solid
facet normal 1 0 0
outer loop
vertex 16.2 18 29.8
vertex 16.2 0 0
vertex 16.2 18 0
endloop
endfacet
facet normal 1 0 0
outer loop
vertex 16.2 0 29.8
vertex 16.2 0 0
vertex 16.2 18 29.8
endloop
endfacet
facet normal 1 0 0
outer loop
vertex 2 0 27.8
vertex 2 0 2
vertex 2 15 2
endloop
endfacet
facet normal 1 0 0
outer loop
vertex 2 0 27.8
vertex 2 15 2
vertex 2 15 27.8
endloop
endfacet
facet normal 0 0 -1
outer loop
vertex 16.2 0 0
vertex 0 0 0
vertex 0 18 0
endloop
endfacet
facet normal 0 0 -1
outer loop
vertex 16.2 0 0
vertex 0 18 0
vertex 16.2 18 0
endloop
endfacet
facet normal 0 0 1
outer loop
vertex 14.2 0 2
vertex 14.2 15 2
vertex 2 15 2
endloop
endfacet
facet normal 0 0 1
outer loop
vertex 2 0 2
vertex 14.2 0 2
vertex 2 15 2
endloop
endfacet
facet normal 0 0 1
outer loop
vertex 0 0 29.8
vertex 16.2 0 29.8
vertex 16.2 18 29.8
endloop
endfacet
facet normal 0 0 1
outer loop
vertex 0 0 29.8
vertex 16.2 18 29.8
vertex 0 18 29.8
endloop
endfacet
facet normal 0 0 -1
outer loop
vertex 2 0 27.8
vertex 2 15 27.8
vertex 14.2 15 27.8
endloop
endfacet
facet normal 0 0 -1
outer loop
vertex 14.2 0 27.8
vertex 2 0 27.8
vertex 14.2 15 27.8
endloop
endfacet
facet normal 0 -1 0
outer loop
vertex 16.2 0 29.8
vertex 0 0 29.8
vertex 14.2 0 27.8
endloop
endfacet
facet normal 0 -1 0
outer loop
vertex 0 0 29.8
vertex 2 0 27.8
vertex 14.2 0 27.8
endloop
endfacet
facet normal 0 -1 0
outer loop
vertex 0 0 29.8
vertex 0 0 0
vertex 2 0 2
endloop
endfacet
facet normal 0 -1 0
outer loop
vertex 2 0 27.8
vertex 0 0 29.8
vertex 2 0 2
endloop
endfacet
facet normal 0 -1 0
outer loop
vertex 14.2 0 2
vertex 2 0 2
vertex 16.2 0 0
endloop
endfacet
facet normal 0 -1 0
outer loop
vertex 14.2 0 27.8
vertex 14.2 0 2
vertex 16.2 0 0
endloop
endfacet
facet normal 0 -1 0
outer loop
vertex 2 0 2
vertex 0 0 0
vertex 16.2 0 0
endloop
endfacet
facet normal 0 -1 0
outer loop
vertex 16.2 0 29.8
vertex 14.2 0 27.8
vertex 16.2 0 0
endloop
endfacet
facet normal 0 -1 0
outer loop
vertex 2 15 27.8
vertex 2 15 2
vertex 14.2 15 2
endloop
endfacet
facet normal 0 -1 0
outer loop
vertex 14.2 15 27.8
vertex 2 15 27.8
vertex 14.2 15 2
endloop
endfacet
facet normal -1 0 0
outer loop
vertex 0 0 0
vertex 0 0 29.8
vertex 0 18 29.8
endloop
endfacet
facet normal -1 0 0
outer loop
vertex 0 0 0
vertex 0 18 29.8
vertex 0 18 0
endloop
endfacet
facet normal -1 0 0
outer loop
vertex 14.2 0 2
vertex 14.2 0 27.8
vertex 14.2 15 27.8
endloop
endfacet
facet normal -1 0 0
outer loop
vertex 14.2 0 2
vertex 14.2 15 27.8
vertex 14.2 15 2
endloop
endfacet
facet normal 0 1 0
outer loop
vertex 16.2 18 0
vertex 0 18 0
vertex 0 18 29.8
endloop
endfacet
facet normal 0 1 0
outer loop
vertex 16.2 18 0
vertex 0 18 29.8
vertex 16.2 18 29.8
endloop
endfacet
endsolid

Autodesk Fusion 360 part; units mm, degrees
sketch "Sketch1" plane through (0, 0, 0) normal (0, 1, 0) x (1, 0, 0)
  line L0 (0, 0) -> (16.2, 0)
  line L1 (16.2, 0) -> (16.2, -29.8)
  line L2 (16.2, -29.8) -> (0, -29.8)
  line L3 (0, -29.8) -> (0, 0)
  dimension "d1" = 16.2
  dimension "d2" = 29.8
extrude "Extrude1" add sketch "Sketch1" along normal blind 18
sketch "Sketch2" plane through (0, 0, 0) normal (0, -1, 0) x (1, 0, 0)
  line L0 (16.2, 29.8) -> (0, 29.8)
  line L1 (0, 29.8) -> (0, 0)
  line L2 (0, 0) -> (16.2, 0)
  line L3 (16.2, 0) -> (16.2, 29.8)
  line L4 (0, 29.8) -> (2, 29.8)
  line L5 (2, 29.8) -> (2, 27.8)
  line L6 (2, 27.8) -> (14.2, 27.8)
  line L7 (14.2, 27.8) -> (14.2, 2)
  line L8 (14.2, 2) -> (2, 2)
  line L9 (2, 2) -> (2, 27.8)
  dimension "d5" = 2
  dimension "d6" = 2
  dimension "d7" = 12.2
  dimension "d8" = 25.8
extrude "Extrude2" cut sketch "Sketch2" against normal blind 15 contours L6 L7 L8 L9
